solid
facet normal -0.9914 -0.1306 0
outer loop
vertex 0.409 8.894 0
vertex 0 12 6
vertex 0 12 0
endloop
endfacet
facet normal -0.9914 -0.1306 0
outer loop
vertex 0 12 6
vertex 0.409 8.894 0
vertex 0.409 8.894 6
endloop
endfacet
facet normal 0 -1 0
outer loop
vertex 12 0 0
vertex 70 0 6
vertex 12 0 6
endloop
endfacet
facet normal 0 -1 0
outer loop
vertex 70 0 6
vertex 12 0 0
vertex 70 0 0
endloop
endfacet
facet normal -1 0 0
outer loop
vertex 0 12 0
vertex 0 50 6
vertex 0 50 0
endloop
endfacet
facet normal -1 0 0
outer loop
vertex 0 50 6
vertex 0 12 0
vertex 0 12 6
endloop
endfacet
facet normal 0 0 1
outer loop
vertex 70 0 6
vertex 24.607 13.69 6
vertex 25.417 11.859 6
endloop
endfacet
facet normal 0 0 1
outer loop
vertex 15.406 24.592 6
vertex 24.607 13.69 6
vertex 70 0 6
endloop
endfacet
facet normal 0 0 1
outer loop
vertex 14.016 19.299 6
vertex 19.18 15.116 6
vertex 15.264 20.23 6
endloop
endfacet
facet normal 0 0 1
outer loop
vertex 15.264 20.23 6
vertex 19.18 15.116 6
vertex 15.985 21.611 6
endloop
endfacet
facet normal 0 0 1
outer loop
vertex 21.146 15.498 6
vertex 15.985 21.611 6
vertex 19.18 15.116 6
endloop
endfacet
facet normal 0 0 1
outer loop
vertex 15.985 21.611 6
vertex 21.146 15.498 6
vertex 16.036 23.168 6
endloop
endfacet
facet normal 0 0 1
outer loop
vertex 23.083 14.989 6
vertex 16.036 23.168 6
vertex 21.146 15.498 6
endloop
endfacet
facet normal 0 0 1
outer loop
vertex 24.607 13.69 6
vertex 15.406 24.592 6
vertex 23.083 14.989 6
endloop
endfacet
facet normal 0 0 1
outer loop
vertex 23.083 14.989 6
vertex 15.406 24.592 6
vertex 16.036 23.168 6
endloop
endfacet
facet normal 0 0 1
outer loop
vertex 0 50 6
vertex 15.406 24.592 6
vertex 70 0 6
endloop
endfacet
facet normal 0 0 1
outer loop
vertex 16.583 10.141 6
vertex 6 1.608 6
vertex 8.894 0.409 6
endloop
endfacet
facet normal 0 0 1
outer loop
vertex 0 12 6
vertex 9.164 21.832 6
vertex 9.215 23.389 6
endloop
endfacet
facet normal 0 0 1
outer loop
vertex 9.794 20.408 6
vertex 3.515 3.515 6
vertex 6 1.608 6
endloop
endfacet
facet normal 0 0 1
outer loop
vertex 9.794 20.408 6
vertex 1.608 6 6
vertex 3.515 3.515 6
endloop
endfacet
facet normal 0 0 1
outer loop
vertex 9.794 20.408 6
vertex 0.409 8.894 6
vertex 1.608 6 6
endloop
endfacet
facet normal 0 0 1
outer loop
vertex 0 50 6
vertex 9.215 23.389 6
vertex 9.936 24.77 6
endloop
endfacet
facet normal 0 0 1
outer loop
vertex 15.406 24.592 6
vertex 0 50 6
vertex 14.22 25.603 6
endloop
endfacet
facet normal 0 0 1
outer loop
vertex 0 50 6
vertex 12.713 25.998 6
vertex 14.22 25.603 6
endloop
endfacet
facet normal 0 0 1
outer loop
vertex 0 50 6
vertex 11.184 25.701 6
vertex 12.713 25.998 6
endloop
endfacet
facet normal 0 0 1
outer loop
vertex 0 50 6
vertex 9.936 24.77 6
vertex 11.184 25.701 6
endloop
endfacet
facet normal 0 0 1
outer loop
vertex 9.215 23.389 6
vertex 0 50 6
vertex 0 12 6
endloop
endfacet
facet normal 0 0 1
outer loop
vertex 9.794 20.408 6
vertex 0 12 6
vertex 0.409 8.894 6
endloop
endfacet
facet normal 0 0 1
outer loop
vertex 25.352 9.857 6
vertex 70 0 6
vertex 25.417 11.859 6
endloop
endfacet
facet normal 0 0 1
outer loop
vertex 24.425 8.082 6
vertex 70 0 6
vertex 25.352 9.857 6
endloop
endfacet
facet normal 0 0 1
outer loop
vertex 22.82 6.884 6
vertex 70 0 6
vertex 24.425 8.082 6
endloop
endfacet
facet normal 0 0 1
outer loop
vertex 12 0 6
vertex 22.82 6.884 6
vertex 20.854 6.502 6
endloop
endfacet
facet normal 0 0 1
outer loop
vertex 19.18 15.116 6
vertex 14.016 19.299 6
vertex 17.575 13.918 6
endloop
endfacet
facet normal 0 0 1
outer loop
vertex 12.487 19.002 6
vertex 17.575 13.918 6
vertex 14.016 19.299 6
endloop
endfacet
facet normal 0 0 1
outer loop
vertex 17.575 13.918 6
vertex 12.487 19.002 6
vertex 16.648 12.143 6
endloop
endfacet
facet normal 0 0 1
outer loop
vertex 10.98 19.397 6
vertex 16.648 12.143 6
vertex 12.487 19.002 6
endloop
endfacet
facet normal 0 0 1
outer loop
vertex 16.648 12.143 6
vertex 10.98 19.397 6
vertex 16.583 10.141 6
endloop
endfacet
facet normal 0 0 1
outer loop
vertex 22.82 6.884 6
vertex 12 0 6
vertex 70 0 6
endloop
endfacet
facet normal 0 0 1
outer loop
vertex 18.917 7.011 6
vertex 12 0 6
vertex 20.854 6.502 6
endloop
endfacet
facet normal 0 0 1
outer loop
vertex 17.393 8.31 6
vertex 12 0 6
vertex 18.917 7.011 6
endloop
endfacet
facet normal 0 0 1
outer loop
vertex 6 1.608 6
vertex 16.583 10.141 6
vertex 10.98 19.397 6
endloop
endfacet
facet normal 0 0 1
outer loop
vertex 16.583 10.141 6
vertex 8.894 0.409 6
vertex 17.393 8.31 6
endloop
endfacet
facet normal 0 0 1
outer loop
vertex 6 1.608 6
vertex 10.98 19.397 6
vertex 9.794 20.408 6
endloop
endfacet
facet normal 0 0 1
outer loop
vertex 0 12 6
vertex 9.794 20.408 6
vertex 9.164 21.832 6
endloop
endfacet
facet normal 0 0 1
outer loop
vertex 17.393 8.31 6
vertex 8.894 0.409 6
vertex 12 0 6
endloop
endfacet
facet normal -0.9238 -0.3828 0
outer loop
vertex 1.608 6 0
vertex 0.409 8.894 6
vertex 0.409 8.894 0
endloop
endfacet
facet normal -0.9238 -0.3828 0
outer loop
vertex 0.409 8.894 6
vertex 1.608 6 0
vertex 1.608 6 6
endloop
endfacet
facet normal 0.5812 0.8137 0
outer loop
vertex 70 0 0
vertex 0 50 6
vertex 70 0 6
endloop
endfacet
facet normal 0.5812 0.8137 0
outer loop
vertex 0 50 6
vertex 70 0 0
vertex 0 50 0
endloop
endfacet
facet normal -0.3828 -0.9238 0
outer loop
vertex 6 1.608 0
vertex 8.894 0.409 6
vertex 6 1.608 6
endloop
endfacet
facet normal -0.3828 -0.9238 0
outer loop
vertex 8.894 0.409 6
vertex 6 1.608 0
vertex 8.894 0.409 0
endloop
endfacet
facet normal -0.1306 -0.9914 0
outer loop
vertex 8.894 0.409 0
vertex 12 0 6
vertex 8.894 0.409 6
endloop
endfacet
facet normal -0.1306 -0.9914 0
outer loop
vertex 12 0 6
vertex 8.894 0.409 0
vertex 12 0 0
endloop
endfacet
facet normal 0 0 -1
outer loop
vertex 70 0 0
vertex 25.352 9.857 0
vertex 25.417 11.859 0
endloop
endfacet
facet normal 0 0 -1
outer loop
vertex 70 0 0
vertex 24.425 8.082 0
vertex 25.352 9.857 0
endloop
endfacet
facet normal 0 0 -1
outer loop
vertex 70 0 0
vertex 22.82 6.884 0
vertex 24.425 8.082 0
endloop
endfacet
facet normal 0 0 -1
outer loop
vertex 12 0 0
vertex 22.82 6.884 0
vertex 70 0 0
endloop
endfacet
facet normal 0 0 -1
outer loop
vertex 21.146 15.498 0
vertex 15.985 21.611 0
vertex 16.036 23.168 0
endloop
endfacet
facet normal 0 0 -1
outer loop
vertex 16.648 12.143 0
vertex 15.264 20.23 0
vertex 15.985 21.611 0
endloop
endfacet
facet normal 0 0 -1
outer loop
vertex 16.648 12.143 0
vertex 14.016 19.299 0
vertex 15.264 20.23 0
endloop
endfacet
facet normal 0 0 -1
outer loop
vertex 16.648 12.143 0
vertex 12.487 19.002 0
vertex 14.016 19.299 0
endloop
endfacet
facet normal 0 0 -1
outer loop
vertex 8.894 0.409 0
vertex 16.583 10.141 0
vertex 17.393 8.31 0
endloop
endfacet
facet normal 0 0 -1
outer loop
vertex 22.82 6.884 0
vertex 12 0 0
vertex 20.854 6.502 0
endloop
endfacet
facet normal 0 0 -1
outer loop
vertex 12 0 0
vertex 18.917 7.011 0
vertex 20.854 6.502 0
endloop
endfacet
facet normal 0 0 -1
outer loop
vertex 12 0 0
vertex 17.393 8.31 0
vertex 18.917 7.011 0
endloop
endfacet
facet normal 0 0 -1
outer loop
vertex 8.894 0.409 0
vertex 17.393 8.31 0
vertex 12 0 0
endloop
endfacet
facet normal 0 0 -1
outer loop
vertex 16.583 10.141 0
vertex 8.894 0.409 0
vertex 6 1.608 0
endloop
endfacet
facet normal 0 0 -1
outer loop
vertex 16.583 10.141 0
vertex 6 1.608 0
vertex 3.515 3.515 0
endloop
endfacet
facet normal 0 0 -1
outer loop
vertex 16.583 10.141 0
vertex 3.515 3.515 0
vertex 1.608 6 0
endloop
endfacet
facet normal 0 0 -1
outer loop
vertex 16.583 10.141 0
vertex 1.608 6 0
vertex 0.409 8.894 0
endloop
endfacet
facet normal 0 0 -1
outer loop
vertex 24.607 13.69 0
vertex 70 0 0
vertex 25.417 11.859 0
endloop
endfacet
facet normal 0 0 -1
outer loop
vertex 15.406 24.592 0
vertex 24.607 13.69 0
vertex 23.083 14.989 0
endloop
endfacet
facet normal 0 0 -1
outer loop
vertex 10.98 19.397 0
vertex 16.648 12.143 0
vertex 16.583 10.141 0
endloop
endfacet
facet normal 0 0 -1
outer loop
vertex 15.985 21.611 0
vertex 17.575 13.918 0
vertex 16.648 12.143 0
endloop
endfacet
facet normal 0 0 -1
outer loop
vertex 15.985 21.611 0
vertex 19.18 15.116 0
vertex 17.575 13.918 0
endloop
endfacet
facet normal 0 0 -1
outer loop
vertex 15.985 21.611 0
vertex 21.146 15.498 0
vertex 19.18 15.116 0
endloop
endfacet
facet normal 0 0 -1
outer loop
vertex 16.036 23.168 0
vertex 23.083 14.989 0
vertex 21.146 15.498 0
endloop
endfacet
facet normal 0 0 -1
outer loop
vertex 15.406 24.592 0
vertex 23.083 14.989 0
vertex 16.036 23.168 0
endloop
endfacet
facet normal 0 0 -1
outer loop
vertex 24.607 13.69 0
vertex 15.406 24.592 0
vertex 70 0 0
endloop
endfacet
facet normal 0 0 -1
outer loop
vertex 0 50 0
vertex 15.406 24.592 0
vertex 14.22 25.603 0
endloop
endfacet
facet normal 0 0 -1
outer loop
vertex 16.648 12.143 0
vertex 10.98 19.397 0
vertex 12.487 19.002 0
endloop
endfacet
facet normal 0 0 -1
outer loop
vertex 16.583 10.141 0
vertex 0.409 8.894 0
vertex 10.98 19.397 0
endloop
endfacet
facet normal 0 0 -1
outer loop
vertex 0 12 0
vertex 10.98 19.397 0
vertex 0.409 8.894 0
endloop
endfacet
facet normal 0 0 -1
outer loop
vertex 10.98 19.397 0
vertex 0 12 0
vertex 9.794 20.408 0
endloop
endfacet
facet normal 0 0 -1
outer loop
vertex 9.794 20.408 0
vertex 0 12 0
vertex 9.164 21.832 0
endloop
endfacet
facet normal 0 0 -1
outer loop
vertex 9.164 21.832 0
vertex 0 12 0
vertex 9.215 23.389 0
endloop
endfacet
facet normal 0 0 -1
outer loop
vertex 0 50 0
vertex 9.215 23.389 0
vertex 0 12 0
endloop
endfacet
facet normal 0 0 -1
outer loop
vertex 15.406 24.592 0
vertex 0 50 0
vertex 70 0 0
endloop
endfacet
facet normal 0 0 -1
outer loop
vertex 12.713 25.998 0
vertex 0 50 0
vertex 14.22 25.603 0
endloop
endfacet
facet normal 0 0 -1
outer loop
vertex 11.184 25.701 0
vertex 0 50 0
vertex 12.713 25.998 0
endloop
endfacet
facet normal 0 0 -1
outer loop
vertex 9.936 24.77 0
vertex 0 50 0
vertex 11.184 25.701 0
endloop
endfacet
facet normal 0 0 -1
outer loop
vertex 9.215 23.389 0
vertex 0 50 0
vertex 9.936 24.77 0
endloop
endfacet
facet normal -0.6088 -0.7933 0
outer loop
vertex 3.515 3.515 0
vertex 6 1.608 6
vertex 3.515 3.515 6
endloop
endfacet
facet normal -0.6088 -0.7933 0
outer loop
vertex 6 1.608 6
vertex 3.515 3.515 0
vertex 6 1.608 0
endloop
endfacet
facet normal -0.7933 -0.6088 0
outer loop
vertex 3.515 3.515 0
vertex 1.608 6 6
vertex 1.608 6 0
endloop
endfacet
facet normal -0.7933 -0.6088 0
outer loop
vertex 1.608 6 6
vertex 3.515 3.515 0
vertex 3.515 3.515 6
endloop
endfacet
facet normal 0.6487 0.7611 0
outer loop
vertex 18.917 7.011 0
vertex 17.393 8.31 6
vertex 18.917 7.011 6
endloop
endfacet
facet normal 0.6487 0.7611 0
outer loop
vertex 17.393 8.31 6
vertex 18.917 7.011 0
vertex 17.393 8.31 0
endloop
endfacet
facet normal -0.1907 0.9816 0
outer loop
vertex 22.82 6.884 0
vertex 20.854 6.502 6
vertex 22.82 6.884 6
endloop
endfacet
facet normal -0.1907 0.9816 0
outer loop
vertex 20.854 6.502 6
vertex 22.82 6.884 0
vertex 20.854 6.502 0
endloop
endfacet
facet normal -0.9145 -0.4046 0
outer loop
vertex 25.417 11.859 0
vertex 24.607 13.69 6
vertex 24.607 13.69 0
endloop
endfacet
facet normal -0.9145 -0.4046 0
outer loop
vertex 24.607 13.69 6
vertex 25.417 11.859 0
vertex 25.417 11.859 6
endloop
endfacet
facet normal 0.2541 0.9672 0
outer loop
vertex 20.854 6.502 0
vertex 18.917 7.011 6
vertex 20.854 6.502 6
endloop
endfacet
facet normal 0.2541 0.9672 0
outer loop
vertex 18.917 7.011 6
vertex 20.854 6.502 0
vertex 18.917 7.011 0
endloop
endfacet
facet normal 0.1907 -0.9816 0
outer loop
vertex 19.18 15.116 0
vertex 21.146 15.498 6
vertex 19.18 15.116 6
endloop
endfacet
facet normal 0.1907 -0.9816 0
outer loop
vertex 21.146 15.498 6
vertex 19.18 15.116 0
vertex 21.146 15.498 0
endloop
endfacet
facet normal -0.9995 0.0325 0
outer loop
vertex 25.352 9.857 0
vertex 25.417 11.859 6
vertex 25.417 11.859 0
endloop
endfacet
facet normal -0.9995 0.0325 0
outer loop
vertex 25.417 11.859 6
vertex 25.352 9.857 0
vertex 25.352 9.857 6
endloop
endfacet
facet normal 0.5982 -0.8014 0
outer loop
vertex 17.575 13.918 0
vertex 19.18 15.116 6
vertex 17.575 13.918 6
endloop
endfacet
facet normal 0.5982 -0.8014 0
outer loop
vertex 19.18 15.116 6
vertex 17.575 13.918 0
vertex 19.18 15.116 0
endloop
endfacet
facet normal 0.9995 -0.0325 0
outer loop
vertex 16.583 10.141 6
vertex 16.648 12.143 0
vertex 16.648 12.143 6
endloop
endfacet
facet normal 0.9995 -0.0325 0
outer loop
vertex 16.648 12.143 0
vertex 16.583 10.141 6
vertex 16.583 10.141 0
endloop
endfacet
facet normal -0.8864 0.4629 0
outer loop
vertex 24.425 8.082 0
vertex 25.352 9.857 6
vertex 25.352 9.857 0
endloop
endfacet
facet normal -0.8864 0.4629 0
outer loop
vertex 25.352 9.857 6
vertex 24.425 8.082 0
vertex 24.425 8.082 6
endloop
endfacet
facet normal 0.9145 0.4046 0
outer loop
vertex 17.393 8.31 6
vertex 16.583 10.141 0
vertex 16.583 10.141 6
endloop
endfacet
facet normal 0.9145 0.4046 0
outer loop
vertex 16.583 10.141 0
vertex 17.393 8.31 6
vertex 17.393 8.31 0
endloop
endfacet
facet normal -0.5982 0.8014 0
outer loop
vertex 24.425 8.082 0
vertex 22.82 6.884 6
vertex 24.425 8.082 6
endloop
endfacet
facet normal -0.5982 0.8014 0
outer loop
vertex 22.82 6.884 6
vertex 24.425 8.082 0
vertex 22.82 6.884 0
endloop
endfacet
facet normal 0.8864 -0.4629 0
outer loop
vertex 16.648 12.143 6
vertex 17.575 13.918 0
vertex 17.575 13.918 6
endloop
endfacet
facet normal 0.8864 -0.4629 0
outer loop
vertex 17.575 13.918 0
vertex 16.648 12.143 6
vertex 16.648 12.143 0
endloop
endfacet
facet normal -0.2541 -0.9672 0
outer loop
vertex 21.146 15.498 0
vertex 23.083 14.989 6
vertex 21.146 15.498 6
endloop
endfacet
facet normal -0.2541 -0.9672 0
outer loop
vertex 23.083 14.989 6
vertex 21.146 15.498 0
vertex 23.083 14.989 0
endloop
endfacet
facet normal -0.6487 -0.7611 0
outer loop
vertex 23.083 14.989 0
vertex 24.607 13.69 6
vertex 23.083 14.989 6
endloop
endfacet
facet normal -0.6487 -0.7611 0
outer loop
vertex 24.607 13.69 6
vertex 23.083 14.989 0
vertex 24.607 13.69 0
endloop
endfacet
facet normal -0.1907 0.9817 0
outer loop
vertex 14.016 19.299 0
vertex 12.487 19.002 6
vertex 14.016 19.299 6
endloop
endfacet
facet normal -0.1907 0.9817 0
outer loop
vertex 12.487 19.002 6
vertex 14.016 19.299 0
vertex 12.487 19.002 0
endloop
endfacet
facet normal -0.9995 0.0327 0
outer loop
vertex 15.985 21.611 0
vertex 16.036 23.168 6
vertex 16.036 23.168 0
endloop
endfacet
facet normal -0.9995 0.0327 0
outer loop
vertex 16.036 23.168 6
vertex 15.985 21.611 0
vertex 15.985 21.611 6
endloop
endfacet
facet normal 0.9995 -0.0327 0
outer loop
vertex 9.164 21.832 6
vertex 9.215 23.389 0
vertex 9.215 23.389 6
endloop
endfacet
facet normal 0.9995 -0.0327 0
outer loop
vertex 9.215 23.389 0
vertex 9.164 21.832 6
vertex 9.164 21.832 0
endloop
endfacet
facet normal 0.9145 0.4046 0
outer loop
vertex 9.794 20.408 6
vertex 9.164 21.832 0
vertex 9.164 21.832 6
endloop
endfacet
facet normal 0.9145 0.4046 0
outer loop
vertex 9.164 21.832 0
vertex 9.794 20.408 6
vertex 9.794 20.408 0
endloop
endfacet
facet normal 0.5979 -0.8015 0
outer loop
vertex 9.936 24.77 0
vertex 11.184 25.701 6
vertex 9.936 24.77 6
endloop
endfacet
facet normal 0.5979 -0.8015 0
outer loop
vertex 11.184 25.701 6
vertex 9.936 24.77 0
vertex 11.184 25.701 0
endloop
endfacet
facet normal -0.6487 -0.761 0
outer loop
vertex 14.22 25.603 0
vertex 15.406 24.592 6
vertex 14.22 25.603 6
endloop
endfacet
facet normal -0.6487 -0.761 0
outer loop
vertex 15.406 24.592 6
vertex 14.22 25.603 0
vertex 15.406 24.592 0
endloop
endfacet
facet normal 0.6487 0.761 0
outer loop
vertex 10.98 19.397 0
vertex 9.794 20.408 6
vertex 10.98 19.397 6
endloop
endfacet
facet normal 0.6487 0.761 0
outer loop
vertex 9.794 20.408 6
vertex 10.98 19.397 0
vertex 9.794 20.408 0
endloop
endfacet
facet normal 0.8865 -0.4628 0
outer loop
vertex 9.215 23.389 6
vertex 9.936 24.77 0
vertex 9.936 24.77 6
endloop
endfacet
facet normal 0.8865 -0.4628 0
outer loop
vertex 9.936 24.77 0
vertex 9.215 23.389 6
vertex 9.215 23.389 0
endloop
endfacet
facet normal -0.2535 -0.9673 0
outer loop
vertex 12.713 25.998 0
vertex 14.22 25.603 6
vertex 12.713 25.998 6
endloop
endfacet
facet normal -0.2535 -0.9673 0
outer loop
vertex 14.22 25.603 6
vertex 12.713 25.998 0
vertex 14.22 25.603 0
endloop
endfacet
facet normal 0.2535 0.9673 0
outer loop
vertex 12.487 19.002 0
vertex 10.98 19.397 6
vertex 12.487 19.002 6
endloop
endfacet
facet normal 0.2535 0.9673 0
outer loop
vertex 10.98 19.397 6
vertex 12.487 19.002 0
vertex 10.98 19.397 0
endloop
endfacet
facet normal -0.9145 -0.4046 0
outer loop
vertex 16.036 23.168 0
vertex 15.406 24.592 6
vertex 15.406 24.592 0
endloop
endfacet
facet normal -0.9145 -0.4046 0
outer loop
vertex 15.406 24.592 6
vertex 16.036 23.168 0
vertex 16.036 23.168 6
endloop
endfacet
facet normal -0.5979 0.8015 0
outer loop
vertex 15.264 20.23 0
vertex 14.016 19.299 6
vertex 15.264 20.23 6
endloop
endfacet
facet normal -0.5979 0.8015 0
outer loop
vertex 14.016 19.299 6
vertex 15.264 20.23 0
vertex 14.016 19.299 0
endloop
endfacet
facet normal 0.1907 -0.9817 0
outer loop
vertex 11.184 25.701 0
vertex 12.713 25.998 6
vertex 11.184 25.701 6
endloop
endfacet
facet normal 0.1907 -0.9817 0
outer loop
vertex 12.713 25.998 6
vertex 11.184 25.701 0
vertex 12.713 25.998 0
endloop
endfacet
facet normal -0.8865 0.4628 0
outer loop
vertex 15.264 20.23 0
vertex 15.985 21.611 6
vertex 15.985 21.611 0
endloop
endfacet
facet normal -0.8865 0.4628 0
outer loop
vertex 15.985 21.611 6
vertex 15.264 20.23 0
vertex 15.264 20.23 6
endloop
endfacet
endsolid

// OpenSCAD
$fn = 32;

// ----------------------------------------------------------------------
// Bracket plate: corner pad 70 x 50, fillet R12
// ----------------------------------------------------------------------

// --- parameters (mm) ---
hole_r = 3.5;             // bolt hole radius
plate_t = 6;              // plate thickness, Z (extrusion height)
leg_a = 70;               // base leg
leg_b = 50;               // height leg
fillet_r = 12;            // right-angle fillet radius

hole_d1 = 2 * hole_r + 2;
hole_d2 = 2 * hole_r;

profile = [[12, 0], [70, 0], [0, 50], [0, 12], [0.409, 8.894], [1.608, 6], [3.515, 3.515], [6, 1.608], [8.894, 0.409]];  // primary outline, 9 points, counter clockwise
void_1 = [[25.417, 11.859], [24.607, 13.69], [23.083, 14.989], [21.146, 15.498], [19.18, 15.116], [17.575, 13.918], [16.648, 12.143], [16.583, 10.141], [17.393, 8.31], [18.917, 7.011], [20.854, 6.502], [22.82, 6.884], [24.425, 8.082], [25.352, 9.857]];  // mount hole 1, 14 points
void_2 = [[16.036, 23.168], [15.406, 24.592], [14.22, 25.603], [12.713, 25.998], [11.184, 25.701], [9.936, 24.77], [9.215, 23.389], [9.164, 21.832], [9.794, 20.408], [10.98, 19.397], [12.487, 19.002], [14.016, 19.299], [15.264, 20.23], [15.985, 21.611]];  // mount hole 2, 14 points

// --- the one profile operation ---
difference() {
  linear_extrude(height = plate_t) polygon(points = profile);
  translate([0, 0, -1])
    linear_extrude(height = plate_t + 2) polygon(points = void_1);
  translate([0, 0, -1])
    linear_extrude(height = plate_t + 2) polygon(points = void_2);
}
